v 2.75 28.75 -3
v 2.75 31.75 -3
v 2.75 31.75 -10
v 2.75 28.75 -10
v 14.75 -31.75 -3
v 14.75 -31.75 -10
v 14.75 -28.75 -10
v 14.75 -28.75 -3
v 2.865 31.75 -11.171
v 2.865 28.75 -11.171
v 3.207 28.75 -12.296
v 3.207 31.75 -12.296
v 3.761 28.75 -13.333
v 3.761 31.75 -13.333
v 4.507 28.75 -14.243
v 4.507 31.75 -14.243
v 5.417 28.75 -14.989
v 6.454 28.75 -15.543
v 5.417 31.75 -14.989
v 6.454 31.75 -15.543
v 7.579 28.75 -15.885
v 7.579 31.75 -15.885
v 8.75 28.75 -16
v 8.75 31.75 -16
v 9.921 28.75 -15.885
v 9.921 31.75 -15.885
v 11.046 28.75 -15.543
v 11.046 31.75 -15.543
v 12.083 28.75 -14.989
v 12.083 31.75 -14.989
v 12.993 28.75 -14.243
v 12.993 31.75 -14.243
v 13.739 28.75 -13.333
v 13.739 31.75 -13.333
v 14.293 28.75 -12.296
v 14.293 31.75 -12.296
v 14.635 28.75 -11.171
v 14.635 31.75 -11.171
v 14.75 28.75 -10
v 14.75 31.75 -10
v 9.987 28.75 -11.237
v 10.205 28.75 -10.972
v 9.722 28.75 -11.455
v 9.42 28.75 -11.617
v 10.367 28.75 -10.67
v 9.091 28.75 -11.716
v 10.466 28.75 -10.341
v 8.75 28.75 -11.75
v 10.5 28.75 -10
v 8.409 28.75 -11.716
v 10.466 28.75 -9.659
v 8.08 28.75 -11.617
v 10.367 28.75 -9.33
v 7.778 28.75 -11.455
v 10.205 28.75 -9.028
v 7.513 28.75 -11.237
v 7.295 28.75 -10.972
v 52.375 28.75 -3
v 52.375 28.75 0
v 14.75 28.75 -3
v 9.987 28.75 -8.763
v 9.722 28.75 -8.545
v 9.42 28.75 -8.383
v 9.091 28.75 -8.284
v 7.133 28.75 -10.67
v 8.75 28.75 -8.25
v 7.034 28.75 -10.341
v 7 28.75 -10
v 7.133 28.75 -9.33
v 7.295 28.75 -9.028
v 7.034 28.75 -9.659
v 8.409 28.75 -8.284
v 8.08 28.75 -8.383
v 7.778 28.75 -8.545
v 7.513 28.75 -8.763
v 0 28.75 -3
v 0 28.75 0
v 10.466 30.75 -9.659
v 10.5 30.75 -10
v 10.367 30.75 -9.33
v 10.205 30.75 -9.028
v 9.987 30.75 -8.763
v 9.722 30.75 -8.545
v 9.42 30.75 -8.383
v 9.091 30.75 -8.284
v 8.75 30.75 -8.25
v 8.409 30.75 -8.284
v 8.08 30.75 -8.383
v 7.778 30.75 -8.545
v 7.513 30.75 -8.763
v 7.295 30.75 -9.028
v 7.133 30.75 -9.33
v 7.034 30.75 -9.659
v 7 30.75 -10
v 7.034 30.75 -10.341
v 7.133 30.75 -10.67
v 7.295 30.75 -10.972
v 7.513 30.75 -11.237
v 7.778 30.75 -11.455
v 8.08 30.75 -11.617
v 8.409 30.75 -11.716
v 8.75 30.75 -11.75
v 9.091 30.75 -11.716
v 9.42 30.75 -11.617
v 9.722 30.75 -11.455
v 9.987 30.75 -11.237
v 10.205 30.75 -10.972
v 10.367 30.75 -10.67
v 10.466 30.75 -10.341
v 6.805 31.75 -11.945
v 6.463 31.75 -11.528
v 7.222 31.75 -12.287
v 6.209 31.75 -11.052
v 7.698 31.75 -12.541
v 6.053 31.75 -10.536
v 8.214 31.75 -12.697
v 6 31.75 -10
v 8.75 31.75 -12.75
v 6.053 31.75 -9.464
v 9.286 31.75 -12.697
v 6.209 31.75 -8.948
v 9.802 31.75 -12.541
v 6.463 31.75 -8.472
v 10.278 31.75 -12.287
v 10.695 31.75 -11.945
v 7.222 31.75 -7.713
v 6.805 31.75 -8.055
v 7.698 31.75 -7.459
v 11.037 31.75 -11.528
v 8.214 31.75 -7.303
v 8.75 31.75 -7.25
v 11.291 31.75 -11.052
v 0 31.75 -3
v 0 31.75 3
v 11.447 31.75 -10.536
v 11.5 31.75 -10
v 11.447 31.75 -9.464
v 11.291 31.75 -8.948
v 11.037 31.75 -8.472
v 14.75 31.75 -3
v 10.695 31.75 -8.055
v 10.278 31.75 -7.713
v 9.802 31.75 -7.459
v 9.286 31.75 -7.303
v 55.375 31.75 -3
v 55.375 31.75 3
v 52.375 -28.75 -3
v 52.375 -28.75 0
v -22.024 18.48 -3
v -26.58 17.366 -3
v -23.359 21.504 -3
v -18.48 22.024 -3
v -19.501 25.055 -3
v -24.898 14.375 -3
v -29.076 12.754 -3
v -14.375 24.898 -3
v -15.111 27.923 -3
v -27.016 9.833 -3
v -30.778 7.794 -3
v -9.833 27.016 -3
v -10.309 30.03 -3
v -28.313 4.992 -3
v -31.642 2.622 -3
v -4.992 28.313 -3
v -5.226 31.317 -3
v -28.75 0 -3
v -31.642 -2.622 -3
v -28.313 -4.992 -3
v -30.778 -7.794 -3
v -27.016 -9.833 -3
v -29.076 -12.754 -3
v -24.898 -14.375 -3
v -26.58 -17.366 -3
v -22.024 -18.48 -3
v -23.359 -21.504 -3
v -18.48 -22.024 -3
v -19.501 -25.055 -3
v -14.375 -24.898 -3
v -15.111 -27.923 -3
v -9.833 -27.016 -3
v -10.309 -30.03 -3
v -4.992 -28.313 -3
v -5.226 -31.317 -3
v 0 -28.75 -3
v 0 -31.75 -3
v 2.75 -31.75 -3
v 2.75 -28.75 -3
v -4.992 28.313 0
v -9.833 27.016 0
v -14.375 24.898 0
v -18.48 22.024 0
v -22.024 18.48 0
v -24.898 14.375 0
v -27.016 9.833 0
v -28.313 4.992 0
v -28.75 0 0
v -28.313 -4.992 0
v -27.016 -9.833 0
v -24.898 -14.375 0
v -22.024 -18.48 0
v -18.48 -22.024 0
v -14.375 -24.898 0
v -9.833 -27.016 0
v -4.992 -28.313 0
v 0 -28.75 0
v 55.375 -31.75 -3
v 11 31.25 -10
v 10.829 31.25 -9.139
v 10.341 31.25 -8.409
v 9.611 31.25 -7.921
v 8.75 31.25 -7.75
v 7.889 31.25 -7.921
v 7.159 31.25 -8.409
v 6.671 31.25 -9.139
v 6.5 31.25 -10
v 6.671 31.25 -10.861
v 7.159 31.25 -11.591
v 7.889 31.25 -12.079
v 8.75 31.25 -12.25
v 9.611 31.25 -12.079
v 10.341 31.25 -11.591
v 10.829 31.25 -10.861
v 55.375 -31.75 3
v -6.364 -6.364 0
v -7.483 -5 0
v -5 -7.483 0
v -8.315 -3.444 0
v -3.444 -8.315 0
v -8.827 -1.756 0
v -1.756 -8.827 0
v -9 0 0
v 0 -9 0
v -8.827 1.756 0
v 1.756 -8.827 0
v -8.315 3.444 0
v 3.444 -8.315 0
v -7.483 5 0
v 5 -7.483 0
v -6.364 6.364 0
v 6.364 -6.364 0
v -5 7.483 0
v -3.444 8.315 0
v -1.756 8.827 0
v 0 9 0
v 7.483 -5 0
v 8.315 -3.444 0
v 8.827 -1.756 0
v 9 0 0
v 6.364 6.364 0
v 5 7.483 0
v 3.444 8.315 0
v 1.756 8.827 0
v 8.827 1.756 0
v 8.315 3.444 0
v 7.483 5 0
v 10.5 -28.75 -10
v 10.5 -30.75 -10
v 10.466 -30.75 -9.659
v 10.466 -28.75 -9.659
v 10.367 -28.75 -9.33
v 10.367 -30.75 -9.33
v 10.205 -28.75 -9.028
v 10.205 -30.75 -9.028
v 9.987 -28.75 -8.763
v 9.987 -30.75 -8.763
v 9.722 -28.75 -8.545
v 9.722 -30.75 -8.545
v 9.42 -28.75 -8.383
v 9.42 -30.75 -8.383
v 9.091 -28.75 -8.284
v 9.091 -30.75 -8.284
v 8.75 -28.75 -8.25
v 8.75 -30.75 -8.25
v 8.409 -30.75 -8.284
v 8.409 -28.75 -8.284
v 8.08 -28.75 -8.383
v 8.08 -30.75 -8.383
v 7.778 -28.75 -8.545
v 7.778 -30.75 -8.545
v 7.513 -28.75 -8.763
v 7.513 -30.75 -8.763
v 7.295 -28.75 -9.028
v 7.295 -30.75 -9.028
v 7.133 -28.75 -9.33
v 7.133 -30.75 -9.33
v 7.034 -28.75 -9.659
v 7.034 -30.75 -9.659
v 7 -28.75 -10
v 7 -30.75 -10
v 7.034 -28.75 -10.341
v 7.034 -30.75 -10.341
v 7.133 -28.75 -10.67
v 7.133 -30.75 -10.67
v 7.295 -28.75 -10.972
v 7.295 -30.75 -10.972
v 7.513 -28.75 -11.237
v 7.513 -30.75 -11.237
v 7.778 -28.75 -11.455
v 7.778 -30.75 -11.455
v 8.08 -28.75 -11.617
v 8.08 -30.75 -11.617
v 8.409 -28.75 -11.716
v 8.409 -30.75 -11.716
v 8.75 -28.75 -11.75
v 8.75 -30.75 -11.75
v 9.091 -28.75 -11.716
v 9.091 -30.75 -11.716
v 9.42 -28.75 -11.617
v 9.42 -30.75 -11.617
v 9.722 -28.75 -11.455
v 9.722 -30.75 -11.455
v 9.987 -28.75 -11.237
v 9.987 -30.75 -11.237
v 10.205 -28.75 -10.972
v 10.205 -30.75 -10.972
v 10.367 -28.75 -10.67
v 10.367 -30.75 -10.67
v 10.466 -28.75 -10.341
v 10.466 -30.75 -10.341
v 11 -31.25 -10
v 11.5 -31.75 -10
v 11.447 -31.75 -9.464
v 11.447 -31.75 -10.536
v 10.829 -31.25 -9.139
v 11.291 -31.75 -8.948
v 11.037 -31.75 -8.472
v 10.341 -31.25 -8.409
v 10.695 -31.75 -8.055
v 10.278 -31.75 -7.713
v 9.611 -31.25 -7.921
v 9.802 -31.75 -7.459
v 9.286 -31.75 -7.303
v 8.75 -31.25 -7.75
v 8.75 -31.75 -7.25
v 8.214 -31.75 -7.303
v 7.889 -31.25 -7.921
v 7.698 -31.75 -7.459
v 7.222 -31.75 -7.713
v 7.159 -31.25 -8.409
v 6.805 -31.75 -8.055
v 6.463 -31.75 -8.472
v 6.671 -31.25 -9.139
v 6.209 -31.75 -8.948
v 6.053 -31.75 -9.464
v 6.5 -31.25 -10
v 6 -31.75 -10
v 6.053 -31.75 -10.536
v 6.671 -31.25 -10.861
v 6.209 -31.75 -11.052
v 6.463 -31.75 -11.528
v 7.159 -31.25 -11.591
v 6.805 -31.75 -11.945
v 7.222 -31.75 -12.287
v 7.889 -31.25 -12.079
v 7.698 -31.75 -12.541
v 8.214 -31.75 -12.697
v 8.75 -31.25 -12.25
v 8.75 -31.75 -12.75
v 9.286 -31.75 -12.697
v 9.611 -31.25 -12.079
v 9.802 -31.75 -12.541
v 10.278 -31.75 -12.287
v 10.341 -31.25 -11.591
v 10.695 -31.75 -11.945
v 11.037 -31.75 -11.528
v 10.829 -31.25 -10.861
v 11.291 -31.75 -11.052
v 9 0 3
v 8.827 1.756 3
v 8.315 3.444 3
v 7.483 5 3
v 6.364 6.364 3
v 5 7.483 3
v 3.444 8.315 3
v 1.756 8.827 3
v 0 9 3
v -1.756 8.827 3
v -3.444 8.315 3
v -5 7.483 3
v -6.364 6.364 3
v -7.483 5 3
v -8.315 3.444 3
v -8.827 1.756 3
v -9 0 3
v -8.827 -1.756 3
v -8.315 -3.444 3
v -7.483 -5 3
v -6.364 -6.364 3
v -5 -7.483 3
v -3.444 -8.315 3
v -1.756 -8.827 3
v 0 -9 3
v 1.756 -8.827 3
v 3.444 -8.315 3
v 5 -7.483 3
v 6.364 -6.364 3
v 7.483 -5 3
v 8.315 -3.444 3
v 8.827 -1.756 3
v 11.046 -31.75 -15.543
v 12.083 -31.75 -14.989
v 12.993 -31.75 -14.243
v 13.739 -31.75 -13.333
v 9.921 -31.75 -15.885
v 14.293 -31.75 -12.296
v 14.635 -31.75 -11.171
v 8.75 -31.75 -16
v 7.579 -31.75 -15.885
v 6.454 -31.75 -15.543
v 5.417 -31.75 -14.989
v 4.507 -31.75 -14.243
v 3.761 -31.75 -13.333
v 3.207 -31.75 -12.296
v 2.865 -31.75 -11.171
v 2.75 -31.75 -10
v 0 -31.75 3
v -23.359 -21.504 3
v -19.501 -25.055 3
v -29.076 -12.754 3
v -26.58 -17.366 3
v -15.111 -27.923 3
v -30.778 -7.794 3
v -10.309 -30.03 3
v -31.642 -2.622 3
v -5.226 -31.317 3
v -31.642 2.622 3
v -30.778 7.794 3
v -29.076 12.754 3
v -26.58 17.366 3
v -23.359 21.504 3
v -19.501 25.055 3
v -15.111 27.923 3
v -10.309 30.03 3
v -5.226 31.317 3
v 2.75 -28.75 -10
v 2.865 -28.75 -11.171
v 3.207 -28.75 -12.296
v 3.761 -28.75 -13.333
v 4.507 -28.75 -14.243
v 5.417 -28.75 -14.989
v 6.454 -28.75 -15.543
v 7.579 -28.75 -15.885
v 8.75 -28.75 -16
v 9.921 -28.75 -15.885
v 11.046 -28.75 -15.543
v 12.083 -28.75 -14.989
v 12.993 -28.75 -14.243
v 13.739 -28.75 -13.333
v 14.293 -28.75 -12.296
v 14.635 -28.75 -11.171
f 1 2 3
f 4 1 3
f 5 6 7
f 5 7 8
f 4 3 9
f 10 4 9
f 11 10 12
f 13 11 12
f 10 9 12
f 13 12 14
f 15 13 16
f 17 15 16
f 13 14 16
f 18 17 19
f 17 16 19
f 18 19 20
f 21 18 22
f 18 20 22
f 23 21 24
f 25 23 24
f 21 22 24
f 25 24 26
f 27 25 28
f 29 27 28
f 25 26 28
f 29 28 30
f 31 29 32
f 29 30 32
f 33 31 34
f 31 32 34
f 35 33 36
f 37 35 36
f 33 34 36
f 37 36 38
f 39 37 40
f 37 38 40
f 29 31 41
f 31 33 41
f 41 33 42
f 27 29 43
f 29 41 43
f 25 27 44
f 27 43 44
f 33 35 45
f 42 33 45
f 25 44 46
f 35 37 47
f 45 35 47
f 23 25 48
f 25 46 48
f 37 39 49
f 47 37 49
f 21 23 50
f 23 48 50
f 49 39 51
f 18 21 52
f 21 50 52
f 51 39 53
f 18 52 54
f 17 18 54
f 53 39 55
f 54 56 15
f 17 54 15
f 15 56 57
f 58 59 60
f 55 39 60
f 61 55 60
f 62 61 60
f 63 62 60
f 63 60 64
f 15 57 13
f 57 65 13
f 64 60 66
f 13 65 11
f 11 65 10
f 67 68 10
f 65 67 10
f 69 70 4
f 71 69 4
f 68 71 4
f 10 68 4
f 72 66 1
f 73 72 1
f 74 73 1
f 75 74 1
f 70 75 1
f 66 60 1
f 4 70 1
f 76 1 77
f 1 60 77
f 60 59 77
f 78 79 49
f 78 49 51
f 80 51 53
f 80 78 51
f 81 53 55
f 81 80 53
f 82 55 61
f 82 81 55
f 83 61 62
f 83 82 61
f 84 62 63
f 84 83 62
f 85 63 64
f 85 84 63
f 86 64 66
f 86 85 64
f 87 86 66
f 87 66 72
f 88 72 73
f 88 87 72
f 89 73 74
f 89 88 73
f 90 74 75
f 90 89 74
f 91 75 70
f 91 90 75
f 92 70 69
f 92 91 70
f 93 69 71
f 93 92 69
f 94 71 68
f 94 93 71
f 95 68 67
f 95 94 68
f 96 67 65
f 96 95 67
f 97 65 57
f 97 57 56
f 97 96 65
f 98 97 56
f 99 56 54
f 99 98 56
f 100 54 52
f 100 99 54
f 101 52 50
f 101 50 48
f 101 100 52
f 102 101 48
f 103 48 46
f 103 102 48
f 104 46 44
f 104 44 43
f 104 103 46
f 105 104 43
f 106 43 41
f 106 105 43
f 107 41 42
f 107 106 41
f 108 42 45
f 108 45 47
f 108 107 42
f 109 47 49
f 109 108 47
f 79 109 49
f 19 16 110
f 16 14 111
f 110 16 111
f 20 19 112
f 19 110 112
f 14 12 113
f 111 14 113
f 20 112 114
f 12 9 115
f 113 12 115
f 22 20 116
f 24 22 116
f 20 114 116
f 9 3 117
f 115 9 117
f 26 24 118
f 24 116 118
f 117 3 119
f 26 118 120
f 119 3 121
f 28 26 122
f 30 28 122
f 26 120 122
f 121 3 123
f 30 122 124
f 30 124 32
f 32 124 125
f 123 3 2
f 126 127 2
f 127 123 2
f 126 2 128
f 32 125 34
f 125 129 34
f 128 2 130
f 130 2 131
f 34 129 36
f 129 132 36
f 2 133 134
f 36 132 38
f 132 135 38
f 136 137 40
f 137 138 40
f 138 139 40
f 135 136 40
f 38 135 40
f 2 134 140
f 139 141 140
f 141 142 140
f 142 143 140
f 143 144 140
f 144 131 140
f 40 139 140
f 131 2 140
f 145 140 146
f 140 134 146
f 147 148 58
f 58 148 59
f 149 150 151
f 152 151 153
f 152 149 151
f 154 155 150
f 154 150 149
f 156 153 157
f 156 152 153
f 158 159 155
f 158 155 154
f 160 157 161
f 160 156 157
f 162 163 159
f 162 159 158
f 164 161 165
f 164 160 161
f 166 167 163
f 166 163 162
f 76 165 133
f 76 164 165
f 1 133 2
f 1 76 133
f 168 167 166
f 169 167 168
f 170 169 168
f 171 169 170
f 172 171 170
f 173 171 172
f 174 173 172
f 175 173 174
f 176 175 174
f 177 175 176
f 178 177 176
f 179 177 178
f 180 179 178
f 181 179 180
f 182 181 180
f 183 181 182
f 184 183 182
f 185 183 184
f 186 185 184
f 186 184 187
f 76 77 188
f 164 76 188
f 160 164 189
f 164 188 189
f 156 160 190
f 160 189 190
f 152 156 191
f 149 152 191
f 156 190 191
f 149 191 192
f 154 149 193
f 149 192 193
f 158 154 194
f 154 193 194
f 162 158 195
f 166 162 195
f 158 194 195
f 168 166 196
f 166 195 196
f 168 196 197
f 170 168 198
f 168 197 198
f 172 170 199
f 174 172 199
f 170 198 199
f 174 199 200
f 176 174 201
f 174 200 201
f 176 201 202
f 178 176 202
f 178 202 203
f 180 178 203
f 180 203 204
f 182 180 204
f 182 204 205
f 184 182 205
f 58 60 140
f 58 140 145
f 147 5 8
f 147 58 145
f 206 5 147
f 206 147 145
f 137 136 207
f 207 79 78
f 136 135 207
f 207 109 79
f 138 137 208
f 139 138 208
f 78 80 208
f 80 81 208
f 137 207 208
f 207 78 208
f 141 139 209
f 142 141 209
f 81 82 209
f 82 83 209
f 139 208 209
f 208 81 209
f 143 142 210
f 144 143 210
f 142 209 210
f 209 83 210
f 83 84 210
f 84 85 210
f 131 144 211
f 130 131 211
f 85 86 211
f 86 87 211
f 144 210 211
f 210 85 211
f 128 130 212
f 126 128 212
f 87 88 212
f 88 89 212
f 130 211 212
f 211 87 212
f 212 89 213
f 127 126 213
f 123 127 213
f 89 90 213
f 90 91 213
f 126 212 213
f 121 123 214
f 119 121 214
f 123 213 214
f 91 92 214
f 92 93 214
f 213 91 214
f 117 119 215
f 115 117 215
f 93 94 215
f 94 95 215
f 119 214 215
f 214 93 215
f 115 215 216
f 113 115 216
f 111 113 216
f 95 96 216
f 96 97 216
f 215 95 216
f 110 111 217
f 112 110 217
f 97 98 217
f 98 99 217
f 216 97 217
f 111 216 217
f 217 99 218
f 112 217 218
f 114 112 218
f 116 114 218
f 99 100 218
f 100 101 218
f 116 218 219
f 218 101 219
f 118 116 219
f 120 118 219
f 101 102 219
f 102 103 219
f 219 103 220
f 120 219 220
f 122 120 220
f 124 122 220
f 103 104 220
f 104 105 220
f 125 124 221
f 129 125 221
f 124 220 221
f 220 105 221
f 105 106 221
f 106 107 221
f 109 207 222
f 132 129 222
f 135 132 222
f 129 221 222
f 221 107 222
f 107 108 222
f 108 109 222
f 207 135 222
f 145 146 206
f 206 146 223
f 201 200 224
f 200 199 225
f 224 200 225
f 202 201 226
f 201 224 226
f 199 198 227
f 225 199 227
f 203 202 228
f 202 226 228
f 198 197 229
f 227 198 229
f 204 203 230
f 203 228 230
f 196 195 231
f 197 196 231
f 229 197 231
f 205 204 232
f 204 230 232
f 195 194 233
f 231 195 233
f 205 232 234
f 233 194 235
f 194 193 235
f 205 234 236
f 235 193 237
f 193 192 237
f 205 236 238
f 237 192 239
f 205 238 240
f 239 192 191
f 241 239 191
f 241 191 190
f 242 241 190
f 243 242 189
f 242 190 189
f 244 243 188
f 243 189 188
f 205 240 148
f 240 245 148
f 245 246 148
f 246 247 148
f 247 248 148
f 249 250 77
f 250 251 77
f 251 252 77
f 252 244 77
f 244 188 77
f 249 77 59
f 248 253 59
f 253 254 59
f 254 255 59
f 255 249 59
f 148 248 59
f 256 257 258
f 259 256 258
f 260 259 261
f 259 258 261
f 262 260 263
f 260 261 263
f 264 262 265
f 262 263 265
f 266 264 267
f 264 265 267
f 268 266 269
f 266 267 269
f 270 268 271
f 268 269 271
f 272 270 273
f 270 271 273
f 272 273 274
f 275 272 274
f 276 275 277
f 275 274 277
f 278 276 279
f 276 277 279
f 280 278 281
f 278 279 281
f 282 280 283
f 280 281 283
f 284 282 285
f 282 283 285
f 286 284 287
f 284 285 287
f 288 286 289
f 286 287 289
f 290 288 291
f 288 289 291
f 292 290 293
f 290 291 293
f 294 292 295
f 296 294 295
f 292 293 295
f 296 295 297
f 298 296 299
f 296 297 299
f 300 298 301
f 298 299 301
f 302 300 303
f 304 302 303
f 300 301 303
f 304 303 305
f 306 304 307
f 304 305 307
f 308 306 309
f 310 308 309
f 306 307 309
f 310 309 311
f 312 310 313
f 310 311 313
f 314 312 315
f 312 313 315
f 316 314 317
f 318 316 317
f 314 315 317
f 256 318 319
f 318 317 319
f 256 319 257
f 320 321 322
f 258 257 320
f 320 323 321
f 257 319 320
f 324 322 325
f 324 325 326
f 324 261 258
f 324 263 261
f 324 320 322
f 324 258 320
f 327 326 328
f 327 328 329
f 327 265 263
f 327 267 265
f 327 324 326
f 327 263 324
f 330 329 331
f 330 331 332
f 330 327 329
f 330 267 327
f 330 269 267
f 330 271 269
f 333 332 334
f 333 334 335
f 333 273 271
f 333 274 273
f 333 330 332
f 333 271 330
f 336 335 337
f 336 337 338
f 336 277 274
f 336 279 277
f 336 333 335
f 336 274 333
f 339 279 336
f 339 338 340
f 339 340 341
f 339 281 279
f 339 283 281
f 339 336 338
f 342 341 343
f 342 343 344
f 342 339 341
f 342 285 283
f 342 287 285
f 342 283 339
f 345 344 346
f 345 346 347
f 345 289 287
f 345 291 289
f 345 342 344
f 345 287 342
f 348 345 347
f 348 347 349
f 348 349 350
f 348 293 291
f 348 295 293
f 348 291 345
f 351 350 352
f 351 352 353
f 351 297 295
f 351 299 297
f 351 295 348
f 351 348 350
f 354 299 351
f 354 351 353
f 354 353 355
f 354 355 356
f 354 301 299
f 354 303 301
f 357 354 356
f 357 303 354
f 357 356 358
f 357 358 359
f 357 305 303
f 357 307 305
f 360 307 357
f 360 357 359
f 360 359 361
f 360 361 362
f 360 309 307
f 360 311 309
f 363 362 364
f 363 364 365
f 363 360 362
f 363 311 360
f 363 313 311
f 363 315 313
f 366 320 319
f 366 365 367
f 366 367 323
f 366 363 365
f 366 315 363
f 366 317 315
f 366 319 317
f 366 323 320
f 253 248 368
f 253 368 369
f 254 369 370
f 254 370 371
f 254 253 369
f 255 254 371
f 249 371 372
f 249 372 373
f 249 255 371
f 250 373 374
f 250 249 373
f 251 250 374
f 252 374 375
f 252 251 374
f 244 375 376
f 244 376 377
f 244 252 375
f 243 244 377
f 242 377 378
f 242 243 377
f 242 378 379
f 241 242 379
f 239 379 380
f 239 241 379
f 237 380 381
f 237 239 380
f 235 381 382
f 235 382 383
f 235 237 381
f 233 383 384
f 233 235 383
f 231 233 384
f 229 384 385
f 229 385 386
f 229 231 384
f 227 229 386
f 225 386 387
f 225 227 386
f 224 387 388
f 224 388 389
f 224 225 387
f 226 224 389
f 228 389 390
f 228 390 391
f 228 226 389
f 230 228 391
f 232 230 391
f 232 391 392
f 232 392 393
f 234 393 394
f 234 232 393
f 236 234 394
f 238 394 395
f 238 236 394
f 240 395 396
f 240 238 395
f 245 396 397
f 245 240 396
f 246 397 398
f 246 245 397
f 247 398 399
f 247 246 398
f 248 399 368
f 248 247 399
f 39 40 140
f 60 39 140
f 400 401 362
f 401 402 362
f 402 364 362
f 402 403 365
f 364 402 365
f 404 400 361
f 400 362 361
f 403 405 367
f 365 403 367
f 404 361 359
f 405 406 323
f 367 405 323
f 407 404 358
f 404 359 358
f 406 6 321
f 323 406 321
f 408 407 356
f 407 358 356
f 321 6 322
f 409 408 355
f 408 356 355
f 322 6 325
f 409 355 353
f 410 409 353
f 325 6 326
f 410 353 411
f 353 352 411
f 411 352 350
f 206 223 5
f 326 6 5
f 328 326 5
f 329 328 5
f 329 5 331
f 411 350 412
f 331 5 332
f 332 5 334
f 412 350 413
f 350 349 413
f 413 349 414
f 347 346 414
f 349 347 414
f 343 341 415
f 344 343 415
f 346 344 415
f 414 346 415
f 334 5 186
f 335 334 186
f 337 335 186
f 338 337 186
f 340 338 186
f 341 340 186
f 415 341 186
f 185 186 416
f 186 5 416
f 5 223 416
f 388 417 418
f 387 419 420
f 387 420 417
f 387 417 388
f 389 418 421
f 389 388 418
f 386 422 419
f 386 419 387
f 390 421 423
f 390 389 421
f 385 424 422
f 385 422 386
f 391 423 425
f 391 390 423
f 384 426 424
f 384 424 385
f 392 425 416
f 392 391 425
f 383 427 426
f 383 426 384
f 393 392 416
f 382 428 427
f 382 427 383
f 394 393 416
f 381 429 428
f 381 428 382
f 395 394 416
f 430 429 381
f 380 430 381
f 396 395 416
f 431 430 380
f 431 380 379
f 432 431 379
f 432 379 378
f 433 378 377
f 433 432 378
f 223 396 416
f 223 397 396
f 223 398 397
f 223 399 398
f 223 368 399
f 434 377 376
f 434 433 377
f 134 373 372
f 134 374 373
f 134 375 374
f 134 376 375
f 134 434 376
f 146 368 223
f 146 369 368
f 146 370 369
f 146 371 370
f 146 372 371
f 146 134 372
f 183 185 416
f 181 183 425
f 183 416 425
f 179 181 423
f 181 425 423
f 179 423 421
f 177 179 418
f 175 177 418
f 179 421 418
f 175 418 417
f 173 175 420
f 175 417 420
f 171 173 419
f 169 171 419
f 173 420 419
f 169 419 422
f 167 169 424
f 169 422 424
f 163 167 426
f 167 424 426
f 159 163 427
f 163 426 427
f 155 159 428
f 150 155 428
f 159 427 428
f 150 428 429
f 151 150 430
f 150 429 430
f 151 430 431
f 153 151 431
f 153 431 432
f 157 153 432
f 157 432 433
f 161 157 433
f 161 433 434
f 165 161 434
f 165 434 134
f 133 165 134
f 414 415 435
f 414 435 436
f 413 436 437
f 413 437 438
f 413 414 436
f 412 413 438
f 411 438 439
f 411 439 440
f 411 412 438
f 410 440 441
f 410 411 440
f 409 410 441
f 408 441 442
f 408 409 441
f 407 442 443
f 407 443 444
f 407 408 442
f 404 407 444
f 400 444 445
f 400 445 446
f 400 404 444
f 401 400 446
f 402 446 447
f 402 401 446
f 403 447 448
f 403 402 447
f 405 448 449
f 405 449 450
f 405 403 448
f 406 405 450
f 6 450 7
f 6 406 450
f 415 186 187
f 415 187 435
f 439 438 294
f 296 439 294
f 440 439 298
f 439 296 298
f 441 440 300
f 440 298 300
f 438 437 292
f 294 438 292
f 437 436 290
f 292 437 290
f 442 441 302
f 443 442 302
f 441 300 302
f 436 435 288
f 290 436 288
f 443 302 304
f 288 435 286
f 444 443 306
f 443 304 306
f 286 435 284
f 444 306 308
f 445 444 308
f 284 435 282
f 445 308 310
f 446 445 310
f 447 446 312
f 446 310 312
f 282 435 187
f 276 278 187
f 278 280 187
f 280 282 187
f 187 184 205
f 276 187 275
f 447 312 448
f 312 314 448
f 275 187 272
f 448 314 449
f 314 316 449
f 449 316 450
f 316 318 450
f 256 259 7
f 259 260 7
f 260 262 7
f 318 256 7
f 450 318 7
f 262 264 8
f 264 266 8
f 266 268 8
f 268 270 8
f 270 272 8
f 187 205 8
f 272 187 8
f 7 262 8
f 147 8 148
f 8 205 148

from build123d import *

# Parameters (mm, degrees)
F0_R     = 9
F1_DEPTH = 3
F3_DEPTH = 3
F4_R     = 1.75
F5_DEPTH = 3
F7_SIZE  = 1


# Not quite as in the source:
# - a feature names something its author has since deleted; it is built from what else it names


with BuildPart() as f1:
    # F0 (on Top) → F1 (new body)
    with BuildSketch(Plane.XY):
        with BuildLine():
            Line((55.375, -31.75), (55.375, 31.75))
            Line((55.375, 31.75), (0, 31.75))
            ThreePointArc((0, 31.75), (-31.75, 0), (0, -31.75))
            Line((0, -31.75), (55.375, -31.75))
        make_face()
        Circle(F0_R, mode=Mode.SUBTRACT)
    extrude(amount=F1_DEPTH)

    # F2 (on face) → F3 (join)
    with BuildSketch(Plane(origin=(0, 0, 0), x_dir=(1, 0, 0), z_dir=(0, 0, -1))):
        with BuildLine():
            ThreePointArc((0, 31.75), (-31.75, 0), (0, -31.75))
            Line((0, -31.75), (55.375, -31.75))
            Line((55.375, -31.75), (55.375, 31.75))
            Line((55.375, 31.75), (0, 31.75))
        make_face()
        with BuildLine():
            Line((52.375, -28.75), (0, -28.75))
            ThreePointArc((0, -28.75), (-28.75, 0), (0, 28.75))
            Line((0, 28.75), (52.375, 28.75))
            Line((52.375, 28.75), (52.375, -28.75))
        make_face(mode=Mode.SUBTRACT)
    extrude(amount=F3_DEPTH)

    # F4 (on face) → F5 (join)
    with BuildSketch(Plane.XZ.offset(31.75)):
        with BuildLine():
            Line((14.75, -3), (2.75, -3))
            Line((2.75, -3), (2.75, -10))
            ThreePointArc((2.75, -10), (8.75, -16), (14.75, -10))
            Line((14.75, -10), (14.75, -3))
        make_face()
        with Locations((8.75, -10)):
            Circle(F4_R, mode=Mode.SUBTRACT)
    extrude(amount=-F5_DEPTH)

    # F6: F1 across plane


with BuildPart() as f1_1:
    add(f1.part)
    add(f1.part.mirror(Plane.XZ))

    # F7
    f7_edges = [f1_1.edges().sort_by_distance(p)[0] for p in [
        (7, -31.75, -10),
        (7, 31.75, -10),
    ]]
    chamfer(f7_edges, length=F7_SIZE)


solid = f1_1.part
